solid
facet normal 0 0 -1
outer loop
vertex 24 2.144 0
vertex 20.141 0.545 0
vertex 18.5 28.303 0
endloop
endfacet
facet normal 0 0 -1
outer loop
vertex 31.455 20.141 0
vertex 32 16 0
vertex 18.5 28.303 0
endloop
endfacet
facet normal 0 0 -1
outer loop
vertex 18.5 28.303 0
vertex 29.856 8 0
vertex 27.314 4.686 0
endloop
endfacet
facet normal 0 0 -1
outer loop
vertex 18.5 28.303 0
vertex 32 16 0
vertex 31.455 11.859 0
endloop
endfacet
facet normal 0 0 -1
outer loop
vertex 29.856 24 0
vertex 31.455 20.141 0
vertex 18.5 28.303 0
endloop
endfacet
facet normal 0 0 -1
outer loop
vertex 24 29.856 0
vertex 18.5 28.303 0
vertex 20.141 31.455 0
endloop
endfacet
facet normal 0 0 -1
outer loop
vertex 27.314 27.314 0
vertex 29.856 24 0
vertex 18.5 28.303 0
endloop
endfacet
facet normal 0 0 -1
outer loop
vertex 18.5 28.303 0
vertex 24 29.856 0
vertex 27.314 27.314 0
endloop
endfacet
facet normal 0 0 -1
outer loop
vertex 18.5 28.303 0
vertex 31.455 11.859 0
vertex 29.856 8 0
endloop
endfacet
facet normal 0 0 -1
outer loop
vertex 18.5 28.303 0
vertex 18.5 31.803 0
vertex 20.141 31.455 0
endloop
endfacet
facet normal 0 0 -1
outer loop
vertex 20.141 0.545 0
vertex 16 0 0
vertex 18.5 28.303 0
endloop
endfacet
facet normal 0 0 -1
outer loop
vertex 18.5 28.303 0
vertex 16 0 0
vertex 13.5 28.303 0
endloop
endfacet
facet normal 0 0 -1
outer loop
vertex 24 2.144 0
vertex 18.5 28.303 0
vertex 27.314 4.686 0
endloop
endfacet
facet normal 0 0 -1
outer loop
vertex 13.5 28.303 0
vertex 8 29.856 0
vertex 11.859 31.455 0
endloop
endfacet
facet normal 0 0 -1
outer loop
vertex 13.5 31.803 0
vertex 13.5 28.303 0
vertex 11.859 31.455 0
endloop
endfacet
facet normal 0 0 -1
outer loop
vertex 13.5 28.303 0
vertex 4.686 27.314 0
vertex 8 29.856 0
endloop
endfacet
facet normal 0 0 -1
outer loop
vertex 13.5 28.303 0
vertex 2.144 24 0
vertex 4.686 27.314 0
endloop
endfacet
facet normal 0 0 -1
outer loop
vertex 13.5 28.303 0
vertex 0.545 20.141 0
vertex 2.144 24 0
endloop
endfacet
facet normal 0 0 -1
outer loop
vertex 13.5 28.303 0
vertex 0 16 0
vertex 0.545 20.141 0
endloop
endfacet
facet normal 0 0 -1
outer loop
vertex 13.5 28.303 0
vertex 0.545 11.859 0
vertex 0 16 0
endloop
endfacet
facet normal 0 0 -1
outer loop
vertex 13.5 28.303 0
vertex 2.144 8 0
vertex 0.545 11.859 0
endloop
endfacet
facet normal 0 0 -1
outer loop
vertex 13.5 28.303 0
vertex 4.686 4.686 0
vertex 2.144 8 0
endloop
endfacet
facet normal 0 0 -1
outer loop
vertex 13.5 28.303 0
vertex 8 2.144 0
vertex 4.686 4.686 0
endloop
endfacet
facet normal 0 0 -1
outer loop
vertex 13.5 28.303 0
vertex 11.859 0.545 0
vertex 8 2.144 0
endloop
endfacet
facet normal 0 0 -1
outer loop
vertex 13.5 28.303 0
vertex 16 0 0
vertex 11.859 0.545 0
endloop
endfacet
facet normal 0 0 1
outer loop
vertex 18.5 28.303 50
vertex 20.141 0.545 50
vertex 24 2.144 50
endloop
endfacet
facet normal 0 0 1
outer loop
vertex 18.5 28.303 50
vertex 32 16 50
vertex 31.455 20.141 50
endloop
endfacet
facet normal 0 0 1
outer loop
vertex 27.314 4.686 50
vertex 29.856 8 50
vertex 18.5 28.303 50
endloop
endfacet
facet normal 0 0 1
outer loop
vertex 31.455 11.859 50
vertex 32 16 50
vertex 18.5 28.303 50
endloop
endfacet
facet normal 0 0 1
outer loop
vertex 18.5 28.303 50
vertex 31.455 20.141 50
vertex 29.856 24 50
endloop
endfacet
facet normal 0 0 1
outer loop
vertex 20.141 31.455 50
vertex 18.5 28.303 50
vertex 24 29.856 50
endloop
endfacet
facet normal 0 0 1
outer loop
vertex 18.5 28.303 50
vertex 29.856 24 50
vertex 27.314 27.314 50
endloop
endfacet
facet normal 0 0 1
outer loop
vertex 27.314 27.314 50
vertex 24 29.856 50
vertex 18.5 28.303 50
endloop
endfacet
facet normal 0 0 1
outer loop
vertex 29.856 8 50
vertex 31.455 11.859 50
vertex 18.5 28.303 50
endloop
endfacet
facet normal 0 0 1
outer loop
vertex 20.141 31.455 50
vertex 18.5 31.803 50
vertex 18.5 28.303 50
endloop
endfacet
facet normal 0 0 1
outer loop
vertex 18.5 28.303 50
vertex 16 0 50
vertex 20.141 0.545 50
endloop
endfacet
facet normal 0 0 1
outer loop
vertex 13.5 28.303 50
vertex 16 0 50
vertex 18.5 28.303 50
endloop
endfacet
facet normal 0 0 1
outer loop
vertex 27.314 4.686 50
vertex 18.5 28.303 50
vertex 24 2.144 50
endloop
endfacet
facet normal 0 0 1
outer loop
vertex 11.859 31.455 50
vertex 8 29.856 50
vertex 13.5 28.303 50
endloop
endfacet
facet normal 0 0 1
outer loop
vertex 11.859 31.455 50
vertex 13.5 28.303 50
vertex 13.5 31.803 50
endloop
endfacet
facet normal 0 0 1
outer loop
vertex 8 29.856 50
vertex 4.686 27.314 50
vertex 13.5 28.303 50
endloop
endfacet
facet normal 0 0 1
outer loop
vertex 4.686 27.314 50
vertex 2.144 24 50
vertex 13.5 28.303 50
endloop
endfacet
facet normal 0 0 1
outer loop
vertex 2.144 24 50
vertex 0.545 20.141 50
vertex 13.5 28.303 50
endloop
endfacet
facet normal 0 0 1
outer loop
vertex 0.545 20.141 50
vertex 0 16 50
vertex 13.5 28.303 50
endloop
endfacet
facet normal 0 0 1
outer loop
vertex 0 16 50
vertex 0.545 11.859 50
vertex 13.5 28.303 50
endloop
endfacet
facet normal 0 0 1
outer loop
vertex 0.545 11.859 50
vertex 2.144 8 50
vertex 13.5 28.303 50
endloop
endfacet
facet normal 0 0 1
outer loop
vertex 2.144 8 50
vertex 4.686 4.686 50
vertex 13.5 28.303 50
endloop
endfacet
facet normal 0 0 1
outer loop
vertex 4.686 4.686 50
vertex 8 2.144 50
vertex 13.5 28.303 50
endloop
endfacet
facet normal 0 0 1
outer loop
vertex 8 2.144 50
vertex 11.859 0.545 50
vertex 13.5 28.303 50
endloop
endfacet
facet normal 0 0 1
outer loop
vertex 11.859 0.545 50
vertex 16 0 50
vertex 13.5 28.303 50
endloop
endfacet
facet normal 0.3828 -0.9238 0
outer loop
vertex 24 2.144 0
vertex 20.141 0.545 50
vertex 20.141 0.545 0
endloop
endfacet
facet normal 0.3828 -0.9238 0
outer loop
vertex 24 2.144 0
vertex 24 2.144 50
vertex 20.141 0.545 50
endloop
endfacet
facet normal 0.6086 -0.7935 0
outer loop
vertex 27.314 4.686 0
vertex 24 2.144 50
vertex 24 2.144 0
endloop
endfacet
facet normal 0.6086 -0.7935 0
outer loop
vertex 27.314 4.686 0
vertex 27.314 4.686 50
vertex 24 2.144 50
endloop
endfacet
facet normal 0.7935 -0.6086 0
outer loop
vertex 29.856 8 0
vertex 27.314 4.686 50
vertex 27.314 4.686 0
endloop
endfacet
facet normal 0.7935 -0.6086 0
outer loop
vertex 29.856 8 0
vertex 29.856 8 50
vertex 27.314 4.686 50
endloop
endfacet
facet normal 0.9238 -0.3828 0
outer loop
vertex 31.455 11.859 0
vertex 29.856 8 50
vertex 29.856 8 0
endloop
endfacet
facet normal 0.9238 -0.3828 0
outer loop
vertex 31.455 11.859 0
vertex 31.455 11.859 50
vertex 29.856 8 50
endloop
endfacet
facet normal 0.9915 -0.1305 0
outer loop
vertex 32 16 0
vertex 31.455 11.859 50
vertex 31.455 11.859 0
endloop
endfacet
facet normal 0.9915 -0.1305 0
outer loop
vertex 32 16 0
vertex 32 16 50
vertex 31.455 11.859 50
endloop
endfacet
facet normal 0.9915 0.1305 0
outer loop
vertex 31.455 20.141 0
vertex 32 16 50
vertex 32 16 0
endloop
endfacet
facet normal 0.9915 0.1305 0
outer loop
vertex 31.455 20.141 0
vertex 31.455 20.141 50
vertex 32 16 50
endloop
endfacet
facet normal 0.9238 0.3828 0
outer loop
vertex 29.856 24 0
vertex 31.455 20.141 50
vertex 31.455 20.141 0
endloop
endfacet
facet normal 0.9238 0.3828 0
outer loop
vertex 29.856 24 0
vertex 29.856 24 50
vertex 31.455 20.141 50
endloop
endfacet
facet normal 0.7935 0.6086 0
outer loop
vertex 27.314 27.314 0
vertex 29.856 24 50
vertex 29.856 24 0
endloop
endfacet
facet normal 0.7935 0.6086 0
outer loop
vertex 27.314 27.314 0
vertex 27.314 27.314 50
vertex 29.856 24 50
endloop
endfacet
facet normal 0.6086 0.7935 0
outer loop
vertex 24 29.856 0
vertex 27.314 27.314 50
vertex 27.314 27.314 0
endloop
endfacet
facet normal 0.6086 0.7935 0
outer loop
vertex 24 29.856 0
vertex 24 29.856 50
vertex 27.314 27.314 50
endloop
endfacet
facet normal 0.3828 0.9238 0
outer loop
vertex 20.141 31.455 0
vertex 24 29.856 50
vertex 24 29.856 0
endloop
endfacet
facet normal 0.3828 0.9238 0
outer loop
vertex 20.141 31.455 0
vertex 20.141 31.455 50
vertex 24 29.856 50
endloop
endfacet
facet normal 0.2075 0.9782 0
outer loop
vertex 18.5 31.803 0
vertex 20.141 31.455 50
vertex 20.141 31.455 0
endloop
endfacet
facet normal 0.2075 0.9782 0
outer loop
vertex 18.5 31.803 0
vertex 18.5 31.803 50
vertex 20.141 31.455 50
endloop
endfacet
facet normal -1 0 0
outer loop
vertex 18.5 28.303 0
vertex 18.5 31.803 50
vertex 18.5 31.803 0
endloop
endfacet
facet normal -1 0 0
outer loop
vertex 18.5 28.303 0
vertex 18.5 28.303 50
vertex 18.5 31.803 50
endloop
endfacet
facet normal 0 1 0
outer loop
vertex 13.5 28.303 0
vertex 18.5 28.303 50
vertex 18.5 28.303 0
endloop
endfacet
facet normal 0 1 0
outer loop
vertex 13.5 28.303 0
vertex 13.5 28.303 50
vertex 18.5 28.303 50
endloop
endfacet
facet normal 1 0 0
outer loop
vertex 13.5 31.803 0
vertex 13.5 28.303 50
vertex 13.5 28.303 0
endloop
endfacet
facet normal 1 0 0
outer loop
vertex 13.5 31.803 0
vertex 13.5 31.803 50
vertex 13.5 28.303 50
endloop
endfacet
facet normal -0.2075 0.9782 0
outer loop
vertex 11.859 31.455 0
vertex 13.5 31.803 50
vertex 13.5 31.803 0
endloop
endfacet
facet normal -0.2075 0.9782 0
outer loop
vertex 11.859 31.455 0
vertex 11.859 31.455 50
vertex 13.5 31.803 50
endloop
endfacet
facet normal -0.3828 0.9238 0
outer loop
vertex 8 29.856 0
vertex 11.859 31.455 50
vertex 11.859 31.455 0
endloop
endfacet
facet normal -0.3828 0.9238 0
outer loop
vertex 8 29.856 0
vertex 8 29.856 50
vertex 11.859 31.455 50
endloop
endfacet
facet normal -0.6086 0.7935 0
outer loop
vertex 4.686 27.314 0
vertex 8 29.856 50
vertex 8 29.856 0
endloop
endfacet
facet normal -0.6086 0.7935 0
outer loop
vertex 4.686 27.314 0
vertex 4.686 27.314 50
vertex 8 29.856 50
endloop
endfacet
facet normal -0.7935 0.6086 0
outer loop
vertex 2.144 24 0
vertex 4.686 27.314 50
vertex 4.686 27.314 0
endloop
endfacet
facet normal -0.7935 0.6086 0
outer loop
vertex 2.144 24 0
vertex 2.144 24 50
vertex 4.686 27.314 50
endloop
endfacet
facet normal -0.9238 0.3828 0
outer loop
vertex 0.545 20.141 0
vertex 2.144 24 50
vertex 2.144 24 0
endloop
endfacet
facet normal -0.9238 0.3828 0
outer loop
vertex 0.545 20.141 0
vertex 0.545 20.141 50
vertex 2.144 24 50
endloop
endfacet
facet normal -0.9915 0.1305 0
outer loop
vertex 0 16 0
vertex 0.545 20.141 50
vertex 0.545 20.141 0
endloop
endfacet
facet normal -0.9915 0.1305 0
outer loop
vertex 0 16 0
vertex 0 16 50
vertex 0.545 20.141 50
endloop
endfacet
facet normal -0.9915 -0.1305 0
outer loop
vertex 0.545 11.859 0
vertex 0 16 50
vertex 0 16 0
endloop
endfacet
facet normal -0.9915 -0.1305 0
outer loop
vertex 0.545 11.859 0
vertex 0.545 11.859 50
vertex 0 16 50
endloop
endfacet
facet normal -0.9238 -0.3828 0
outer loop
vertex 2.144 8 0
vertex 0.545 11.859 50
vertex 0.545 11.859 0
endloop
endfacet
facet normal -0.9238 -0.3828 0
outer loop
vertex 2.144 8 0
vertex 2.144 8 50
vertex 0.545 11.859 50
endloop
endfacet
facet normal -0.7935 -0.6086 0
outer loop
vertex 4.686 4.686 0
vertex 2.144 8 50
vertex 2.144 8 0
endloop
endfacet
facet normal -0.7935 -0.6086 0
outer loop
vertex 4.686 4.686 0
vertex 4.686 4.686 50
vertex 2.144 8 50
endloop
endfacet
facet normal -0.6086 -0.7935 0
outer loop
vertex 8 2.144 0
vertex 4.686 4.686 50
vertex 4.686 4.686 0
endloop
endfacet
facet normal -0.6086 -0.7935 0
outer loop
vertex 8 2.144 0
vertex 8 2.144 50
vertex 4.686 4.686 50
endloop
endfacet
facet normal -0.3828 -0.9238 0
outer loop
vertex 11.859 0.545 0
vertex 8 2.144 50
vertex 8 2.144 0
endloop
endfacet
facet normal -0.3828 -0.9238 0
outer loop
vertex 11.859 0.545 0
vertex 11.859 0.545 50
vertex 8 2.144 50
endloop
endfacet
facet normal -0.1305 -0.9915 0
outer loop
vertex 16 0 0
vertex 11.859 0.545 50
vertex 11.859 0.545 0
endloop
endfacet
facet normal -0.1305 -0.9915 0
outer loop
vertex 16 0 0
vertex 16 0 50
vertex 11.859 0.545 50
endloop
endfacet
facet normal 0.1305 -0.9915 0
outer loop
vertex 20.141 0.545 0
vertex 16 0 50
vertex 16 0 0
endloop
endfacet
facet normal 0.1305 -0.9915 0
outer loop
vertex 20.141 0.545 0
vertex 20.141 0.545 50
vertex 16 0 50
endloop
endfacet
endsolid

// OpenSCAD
$fn = 32;

// ----------------------------------------------------------------------
// Keyway shaft: d32 shaft, key 5 x 3.5 mm
// ----------------------------------------------------------------------

// --- parameters (mm) ---
shaft_r = 16;             // shaft radius
key_w = 5;                // keyway width
key_d = 3.5;              // keyway depth below the surface line
plate_t = 50;             // shaft length, Z (extrusion height)

shaft_d = 2 * shaft_r;  // shaft diameter
circle_step = 15;  // polygon sampling step, degrees

profile = [[11.859, 31.455], [8, 29.856], [4.686, 27.314], [2.144, 24], [0.545, 20.141], [0, 16], [0.545, 11.859], [2.144, 8], [4.686, 4.686], [8, 2.144], [11.859, 0.545], [16, 0], [20.141, 0.545], [24, 2.144], [27.314, 4.686], [29.856, 8], [31.455, 11.859], [32, 16], [31.455, 20.141], [29.856, 24], [27.314, 27.314], [24, 29.856], [20.141, 31.455], [18.5, 31.803], [18.5, 28.303], [13.5, 28.303], [13.5, 31.803]];  // primary outline, 27 points, counter clockwise

// --- the one profile operation ---
linear_extrude(height = plate_t) polygon(points = profile);
